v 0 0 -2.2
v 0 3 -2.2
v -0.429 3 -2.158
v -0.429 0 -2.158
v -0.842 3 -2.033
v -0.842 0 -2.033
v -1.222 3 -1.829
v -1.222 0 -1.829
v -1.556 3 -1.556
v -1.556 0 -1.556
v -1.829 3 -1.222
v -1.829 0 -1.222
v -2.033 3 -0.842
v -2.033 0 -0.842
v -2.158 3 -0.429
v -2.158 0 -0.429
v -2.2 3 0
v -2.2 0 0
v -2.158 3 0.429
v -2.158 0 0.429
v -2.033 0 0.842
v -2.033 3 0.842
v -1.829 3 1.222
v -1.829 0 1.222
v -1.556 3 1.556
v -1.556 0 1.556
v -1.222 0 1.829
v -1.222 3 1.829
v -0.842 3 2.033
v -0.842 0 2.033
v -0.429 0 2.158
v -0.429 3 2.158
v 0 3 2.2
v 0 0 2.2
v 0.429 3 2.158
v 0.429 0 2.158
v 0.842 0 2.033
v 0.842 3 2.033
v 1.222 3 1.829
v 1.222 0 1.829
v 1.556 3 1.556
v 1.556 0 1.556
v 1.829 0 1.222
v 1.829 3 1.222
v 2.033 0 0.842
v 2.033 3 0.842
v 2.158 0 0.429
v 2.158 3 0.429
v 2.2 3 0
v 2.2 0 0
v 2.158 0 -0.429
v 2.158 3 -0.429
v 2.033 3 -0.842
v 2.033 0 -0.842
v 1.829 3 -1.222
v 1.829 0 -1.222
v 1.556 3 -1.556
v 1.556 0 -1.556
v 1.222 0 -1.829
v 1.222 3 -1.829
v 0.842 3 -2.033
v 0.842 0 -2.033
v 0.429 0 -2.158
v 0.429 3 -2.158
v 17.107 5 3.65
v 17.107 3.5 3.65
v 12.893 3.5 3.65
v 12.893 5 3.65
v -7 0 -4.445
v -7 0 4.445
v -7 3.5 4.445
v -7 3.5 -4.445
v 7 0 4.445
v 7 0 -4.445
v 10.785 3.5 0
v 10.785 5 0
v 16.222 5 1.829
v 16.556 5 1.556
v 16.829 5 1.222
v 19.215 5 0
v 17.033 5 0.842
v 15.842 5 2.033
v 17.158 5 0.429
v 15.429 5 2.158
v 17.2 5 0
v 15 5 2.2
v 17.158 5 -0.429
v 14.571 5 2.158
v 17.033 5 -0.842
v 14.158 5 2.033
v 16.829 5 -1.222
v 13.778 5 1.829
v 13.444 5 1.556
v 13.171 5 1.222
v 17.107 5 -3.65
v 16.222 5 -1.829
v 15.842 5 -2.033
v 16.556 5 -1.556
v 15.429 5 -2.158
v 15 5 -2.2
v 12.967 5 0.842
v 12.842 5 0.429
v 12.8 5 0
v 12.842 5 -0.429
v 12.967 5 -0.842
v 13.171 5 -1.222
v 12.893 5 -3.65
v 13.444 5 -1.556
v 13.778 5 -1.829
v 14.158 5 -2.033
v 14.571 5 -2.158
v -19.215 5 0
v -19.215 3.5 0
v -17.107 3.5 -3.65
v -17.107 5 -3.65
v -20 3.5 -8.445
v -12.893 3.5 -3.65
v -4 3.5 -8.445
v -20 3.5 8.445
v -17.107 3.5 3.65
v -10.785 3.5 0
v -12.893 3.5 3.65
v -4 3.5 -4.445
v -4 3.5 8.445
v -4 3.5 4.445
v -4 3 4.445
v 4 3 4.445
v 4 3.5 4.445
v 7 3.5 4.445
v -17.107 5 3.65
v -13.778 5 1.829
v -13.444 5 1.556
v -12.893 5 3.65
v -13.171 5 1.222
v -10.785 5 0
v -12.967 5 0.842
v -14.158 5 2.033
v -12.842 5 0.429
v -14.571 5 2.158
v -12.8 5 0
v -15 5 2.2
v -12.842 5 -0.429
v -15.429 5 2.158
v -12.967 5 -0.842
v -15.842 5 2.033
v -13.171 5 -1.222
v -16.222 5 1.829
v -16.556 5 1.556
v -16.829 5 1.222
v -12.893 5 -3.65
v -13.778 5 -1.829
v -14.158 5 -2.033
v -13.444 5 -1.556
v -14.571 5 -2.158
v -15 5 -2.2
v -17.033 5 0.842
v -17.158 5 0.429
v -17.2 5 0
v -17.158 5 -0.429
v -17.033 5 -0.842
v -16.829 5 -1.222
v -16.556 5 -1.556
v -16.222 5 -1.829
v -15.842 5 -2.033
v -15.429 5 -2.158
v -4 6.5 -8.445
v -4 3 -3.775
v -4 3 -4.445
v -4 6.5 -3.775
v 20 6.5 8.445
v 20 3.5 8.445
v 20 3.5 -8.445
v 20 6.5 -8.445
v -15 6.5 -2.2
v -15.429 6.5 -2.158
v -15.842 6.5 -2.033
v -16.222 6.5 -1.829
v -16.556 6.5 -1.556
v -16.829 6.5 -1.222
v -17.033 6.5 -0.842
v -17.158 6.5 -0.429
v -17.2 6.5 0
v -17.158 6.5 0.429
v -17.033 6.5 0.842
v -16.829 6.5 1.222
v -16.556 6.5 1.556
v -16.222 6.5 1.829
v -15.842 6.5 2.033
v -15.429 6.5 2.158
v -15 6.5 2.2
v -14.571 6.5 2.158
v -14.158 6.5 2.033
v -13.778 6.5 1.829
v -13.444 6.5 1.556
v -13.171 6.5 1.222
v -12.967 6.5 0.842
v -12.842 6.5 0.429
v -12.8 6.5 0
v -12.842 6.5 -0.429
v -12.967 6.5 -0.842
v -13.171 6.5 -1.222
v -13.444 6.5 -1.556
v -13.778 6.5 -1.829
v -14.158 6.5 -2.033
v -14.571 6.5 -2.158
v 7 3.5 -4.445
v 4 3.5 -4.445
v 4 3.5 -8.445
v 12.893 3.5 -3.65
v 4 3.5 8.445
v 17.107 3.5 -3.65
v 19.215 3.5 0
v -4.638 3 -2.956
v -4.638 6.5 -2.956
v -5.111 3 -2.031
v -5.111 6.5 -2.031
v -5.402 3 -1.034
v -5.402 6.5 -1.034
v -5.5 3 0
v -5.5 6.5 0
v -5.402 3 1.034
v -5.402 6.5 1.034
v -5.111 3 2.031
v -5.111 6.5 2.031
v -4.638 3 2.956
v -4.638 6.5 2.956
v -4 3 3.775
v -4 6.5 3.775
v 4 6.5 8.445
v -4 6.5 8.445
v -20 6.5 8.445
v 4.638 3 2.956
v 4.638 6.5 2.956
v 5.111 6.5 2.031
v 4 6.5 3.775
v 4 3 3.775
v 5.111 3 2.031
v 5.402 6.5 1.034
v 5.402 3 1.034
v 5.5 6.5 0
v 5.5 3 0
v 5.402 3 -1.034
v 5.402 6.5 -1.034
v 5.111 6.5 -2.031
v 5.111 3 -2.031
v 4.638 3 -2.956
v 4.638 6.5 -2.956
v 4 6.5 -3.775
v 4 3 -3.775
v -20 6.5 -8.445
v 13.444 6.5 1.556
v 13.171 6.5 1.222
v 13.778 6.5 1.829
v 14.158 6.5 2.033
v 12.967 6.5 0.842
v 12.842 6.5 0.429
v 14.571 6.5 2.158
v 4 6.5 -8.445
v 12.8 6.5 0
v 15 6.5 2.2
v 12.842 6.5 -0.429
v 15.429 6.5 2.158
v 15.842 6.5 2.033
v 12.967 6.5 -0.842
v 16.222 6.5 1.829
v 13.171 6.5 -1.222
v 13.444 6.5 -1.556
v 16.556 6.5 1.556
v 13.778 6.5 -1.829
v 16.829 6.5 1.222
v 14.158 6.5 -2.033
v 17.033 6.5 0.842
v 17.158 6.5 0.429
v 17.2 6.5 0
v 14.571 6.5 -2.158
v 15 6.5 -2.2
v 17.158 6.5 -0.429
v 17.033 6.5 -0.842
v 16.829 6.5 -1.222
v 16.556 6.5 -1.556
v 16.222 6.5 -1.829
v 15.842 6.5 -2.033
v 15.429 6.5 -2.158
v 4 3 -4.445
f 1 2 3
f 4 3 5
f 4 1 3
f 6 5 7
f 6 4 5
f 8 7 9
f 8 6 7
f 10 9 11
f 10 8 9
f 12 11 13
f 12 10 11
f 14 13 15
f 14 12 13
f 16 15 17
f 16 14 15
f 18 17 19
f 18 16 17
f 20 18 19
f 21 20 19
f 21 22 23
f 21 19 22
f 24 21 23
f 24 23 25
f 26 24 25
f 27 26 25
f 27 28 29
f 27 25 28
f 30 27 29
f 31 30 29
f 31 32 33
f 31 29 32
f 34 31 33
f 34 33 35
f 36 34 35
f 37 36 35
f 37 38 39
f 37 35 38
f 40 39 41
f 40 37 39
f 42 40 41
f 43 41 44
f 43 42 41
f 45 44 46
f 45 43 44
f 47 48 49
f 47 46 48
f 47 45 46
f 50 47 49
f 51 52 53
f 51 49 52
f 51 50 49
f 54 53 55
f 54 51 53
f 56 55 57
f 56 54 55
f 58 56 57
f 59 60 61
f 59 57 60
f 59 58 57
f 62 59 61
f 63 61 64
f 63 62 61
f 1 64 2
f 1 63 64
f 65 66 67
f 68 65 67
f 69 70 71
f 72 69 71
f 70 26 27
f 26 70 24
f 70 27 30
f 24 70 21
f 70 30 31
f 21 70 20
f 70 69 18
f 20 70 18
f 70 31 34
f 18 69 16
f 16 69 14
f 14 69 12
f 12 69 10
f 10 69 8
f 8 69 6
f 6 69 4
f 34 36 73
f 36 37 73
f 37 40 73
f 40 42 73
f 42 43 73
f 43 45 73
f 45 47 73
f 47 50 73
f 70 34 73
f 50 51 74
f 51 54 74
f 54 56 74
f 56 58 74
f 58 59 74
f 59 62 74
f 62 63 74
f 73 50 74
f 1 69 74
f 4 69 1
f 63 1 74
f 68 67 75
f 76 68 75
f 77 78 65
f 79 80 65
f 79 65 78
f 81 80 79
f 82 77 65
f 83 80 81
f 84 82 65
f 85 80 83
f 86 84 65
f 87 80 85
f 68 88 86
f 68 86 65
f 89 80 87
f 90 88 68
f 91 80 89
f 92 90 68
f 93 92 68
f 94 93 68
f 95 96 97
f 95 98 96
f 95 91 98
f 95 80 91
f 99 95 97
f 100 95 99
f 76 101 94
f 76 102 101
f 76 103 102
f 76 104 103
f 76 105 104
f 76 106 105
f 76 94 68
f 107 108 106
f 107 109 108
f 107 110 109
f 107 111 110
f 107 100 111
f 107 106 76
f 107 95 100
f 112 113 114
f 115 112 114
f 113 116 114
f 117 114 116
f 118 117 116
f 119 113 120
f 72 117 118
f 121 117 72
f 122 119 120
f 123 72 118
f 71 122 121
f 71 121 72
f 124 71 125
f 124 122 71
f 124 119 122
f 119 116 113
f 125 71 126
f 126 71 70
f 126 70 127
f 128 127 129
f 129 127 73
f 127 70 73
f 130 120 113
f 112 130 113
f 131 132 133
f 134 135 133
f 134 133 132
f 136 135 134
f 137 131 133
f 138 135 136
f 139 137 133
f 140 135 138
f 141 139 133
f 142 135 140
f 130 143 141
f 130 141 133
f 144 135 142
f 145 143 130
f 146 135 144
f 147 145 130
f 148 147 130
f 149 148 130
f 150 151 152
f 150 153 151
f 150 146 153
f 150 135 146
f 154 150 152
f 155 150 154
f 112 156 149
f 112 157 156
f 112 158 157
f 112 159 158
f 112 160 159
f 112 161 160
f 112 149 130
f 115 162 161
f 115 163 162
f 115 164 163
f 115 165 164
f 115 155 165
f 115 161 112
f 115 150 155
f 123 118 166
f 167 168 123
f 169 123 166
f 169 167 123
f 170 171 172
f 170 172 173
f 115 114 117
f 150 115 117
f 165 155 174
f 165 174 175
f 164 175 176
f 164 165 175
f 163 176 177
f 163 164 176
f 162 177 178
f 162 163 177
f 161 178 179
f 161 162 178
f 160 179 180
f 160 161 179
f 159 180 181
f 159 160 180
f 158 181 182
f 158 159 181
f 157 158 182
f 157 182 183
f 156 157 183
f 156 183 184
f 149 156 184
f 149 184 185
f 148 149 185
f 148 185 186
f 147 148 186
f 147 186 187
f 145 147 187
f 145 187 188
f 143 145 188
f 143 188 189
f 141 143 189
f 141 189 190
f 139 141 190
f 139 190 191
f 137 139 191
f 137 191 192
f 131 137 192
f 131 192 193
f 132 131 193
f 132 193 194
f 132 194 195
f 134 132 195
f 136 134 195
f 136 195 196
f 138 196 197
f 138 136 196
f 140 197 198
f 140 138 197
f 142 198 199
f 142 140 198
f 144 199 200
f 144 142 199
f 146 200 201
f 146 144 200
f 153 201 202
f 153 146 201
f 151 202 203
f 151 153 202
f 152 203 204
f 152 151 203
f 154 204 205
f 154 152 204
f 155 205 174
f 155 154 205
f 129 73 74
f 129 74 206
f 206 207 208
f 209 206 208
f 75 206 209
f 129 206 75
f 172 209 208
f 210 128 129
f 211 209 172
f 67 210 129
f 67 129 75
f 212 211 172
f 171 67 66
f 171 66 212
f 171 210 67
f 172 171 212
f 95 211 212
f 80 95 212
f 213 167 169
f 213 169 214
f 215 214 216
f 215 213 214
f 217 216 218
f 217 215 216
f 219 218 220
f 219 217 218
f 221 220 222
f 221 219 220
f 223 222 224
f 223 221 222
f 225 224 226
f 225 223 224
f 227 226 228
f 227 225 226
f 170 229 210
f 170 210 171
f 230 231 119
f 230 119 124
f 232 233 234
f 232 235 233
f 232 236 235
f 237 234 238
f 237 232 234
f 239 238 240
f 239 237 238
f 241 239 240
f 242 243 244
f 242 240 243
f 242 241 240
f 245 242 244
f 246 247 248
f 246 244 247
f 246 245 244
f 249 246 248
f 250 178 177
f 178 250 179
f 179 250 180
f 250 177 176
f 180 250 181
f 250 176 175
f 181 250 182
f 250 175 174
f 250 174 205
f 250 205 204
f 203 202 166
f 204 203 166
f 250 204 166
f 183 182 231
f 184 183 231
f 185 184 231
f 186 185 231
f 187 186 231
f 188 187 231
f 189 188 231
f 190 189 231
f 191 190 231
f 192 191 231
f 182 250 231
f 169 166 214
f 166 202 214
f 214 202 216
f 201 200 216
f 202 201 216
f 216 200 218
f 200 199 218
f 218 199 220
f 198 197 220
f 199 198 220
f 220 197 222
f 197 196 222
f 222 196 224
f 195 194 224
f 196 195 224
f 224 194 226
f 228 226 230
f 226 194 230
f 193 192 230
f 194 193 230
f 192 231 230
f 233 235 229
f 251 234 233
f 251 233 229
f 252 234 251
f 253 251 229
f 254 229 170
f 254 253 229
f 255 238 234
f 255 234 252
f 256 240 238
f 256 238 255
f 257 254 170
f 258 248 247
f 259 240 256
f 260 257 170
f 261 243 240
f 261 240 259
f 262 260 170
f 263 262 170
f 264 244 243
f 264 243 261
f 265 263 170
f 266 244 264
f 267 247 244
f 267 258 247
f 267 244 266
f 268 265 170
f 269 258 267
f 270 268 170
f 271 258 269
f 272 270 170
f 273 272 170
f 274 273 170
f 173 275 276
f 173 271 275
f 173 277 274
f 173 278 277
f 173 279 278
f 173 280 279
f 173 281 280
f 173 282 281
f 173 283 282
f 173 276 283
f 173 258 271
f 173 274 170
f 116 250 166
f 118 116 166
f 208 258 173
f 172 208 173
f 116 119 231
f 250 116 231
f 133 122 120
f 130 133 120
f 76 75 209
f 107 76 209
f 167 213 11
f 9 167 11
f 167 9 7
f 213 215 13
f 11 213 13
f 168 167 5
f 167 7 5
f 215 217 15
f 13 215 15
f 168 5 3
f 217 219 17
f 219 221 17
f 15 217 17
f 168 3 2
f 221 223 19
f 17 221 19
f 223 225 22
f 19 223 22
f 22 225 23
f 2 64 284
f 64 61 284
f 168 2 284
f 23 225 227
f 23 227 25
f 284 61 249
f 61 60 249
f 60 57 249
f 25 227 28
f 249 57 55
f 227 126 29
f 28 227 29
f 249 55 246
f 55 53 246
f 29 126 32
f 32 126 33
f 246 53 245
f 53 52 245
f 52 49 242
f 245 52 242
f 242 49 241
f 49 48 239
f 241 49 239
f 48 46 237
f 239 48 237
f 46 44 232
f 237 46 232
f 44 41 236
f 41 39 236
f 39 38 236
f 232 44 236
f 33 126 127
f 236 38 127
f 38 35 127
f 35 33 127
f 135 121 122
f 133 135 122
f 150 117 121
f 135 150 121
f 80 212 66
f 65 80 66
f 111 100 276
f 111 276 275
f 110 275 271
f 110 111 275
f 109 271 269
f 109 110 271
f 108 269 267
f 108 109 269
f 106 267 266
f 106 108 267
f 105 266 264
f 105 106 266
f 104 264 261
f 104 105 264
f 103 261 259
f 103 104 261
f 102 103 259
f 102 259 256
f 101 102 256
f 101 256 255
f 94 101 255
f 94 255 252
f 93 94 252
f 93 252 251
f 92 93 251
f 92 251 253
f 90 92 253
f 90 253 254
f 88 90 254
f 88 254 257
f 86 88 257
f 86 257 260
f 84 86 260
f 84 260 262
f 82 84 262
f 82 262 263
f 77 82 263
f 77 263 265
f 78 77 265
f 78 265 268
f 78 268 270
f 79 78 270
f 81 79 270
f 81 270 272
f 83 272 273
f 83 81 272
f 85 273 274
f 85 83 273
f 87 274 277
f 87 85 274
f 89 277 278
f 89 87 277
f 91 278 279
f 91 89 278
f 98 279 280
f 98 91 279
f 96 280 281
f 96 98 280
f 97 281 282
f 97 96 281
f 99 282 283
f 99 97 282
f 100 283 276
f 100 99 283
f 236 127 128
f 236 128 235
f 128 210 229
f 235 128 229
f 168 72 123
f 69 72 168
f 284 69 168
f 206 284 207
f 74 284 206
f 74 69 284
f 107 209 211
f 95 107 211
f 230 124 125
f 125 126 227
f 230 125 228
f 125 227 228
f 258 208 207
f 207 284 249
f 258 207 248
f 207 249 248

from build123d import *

# Parameters (mm, degrees)
SKETCH1_W           = 40
SKETCH1_H           = 8.89
SKETCH1_R           = 2.2
BOSS_EXTRUDE1_DEPTH = 6.5
CUT_EXTRUDE1_REACH  = 24.832
SKETCH2_W           = 8
SKETCH2_H           = 3.5
SKETCH2_W_2         = 13
SKETCH3_R           = 5.5
CUT_EXTRUDE2_DEPTH  = 3.5
CUT_EXTRUDE3_DEPTH  = 1.5
SKETCH6_W           = 16
SKETCH6_H           = 3
BOSS_EXTRUDE2_DEPTH = 4


with BuildPart() as part:
    # Sketch1 → Boss-Extrude1 (new body)
    with BuildSketch(Plane(origin=(0, 0, 0), x_dir=(1, 0, 0), z_dir=(0, 1, 0))):
        Rectangle(SKETCH1_W, SKETCH1_H)
        with Locations(Location((0, 0, 0), (0, 0, 90))):
            Circle(SKETCH1_R, mode=Mode.SUBTRACT)
        with Locations(Location((-15, 0, 0), (0, 0, 90))):
            Circle(SKETCH1_R, mode=Mode.SUBTRACT)
        with Locations(Location((15, 0, 0), (0, 0, 90))):
            Circle(SKETCH1_R, mode=Mode.SUBTRACT)
    extrude(amount=BOSS_EXTRUDE1_DEPTH)

    # Cut-Extrude1: up to this face of the body (flat: up to its plane)
    cut_extrude1_end = Plane(part.part.faces().sort_by_distance((0, 3.25, -4.445))[0])
    # Sketch2 → Cut-Extrude1 (cut, up to the picked face)
    with BuildSketch(Plane.XY.offset(4.445), mode=Mode.PRIVATE) as cut_extrude1_sk1:
        with Locations((0, 4.75)):
            Rectangle(SKETCH2_W, SKETCH2_H)
    cut_extrude1_tool1 = split(extrude(cut_extrude1_sk1.sketch, amount=-CUT_EXTRUDE1_REACH, mode=Mode.PRIVATE), bisect_by=cut_extrude1_end, keep=Keep.BOTH, mode=Mode.PRIVATE)
    # Sketch2 → Cut-Extrude1 (cut, up to the picked face)
    with BuildSketch(Plane.XY.offset(4.445), mode=Mode.PRIVATE) as cut_extrude1_sk2:
        with Locations((-13.5, 1.75)):
            Rectangle(SKETCH2_W_2, SKETCH2_H)
    cut_extrude1_tool2 = split(extrude(cut_extrude1_sk2.sketch, amount=-CUT_EXTRUDE1_REACH, mode=Mode.PRIVATE), bisect_by=cut_extrude1_end, keep=Keep.BOTH, mode=Mode.PRIVATE)
    # Sketch2 → Cut-Extrude1 (cut, up to the picked face)
    with BuildSketch(Plane.XY.offset(4.445), mode=Mode.PRIVATE) as cut_extrude1_sk3:
        with Locations((13.5, 1.75)):
            Rectangle(SKETCH2_W_2, SKETCH2_H)
    cut_extrude1_tool3 = split(extrude(cut_extrude1_sk3.sketch, amount=-CUT_EXTRUDE1_REACH, mode=Mode.PRIVATE), bisect_by=cut_extrude1_end, keep=Keep.BOTH, mode=Mode.PRIVATE)
    add(cut_extrude1_tool1.solids().sort_by(Axis((0, 4.75, 4.445), (0, 0, -1)))[0], mode=Mode.SUBTRACT)
    add(cut_extrude1_tool2.solids().sort_by(Axis((-13.5, 1.75, 4.445), (0, 0, -1)))[0], mode=Mode.SUBTRACT)
    add(cut_extrude1_tool3.solids().sort_by(Axis((13.5, 1.75, 4.445), (0, 0, -1)))[0], mode=Mode.SUBTRACT)

    # Sketch3 → Cut-Extrude2 (cut)
    with BuildSketch(Plane(origin=(0, 3, 0), x_dir=(1, 0, 0), z_dir=(0, 1, 0))):
        Circle(SKETCH3_R)
    extrude(amount=CUT_EXTRUDE2_DEPTH, mode=Mode.SUBTRACT)

    # Sketch4 → Cut-Extrude3 (cut)
    with BuildSketch(Plane(origin=(0, 3.5, 0), x_dir=(-1, 0, 0), z_dir=(0, -1, 0))):
        Polygon((12.892671517, 3.65), (10.785343035, 0), (12.892671517, -3.65), (17.107328483, -3.65), (19.214656965, 0), (17.107328483, 3.65), align=None)
        Polygon((-17.107328483, 3.65), (-19.214656965, 0), (-17.107328483, -3.65), (-12.892671517, -3.65), (-10.785343035, 0), (-12.892671517, 3.65), align=None)
    extrude(amount=-CUT_EXTRUDE3_DEPTH, mode=Mode.SUBTRACT)

    # Sketch6 → Boss-Extrude2 (add)
    with BuildSketch(Plane.XY.offset(4.445)):
        with Locations((-12, 5)):
            Rectangle(SKETCH6_W, SKETCH6_H)
        with Locations((12, 5)):
            Rectangle(SKETCH6_W, SKETCH6_H)
    boss_extrude2 = extrude(amount=BOSS_EXTRUDE2_DEPTH)

    # Mirror1: Boss-Extrude2 across plane
    add(boss_extrude2.mirror(Plane.XY))


solid = part.part
